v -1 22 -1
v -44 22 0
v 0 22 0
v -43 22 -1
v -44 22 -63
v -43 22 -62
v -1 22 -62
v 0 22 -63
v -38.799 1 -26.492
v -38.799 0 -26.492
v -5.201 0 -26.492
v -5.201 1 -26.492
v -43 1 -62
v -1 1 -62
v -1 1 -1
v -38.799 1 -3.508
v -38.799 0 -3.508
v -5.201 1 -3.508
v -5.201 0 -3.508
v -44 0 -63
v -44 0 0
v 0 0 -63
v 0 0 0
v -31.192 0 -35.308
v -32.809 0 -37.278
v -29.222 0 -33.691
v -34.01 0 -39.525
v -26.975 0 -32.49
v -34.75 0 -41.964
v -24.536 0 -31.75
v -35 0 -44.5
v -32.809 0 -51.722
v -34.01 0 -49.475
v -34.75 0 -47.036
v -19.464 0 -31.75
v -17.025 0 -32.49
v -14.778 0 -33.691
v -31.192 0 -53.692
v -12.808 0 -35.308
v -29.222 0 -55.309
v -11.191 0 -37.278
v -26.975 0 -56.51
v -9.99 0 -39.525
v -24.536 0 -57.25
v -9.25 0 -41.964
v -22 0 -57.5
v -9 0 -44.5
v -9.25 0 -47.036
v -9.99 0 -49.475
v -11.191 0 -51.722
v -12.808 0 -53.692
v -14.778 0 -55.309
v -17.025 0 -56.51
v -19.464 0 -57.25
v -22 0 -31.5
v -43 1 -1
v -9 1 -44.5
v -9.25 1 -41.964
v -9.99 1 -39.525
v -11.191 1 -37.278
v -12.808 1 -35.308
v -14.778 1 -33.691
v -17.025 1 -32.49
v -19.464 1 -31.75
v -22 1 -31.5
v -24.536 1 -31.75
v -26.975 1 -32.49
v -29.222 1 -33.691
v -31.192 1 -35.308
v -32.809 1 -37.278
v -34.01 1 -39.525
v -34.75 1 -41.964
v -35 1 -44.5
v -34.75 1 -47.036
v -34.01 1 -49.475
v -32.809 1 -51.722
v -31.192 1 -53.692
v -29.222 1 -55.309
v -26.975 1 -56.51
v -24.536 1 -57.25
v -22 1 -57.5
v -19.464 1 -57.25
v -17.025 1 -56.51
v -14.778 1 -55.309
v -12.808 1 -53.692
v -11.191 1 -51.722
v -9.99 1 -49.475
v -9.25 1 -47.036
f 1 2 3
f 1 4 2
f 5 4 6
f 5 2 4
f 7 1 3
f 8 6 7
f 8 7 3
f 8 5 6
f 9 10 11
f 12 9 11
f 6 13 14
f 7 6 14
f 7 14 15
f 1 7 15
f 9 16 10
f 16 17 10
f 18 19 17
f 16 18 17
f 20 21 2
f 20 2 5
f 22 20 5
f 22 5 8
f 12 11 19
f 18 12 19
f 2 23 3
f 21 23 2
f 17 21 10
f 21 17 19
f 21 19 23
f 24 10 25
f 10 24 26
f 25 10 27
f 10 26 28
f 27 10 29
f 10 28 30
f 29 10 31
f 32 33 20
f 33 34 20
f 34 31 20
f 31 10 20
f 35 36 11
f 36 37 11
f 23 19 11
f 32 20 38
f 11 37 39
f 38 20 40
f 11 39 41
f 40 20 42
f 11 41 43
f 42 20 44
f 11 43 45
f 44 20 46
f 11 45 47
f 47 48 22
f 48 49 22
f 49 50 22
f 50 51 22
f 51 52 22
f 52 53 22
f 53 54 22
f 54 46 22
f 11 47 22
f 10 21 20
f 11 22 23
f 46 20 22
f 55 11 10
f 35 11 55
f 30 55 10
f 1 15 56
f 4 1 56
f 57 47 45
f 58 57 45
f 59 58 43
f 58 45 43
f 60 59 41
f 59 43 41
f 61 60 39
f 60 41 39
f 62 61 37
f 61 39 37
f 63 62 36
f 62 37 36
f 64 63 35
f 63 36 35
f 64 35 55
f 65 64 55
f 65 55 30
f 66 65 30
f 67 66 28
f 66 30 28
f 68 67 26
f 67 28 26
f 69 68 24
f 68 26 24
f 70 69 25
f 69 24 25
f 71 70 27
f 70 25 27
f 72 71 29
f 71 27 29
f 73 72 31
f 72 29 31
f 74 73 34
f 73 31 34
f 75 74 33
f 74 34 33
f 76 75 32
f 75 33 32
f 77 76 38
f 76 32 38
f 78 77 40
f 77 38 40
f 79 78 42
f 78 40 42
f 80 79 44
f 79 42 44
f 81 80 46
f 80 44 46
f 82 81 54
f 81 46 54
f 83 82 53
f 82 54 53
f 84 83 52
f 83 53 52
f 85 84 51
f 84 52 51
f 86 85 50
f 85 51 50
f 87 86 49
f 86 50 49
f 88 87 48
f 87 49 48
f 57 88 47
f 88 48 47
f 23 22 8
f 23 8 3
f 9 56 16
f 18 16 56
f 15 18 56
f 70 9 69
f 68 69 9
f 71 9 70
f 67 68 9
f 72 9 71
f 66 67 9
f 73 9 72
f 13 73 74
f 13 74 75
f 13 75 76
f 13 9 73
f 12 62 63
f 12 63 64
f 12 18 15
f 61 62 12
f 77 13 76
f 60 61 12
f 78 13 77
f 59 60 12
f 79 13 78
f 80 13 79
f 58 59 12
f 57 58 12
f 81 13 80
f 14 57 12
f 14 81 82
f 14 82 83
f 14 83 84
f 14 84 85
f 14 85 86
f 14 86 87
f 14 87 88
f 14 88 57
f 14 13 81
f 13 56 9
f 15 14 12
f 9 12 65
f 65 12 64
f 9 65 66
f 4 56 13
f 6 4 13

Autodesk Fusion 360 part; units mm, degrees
sketch "Sketch1" plane through (0, 0, 0) normal (0, 1, 0) x (1, 0, 0)
  line L0 (0, 0) -> (-44, 0)
  line L1 (-44, 0) -> (-44, 63)
  line L2 (-44, 63) -> (0, 63)
  line L3 (0, 63) -> (0, 0)
  line L4 (-22, 0) -> (-22, 15)
  line L5 (-44, 0) -> (-22, 0)
  line L6 (-22, 0) -> (-22, 63)
  line L7 (-22, 63) -> (-22, 44.5)
  circle A0 centre (-22, 44.5) radius 13
  line L8 (-44, 63) -> (-22, 63)
  line L9 (-5.2012, 3.5077) -> (-38.7988, 3.5077)
  line L10 (-38.7988, 3.5077) -> (-38.7988, 26.4923)
  line L11 (-38.7988, 26.4923) -> (-5.2012, 26.4923)
  line L12 (-5.2012, 26.4923) -> (-5.2012, 3.5077)
  line L13 (-5.2012, 3.5077) -> (-38.7988, 26.4923) construction
  line L14 (-38.7988, 3.5077) -> (-5.2012, 26.4923) construction
  line L15 (-43, 62) -> (-1, 62)
  line L16 (-1, 62) -> (-1, 1)
  line L17 (-1, 1) -> (-43, 1)
  line L18 (-43, 1) -> (-43, 62)
  dimension "d1" = 44
  dimension "d2" = 63
  dimension "d5" = 15
  dimension "d7" = 18.5
  dimension "d8" = 26
  dimension "d9" = 21
  dimension "d13" = 21.5
  dimension "d14" = 1
extrude "Extrude3" add sketch "Sketch1" along normal blind 22 contours L0 L2 L3 L4 L6 L7 L15 L16 L17 | L0 L1 L2 L4 L5 L6 L7 L8 L15 L17 L18 makes body 1
extrude "Extrude2" add sketch "Sketch1" along normal blind 1 separate body contours L0 L2 L3 L4 L6 L7 L15 L16 L17 | L0 L1 L2 L4 L5 L6 L7 L8 L15 L17 L18 | L4 L6 L7 A0 L9 L10 L11 L15 L17 L18 | L4 L6 L7 A0 L9 L11 L12 L15 L16 L17 makes body 2
combine "Combine1" operation add target body 1 tool bodies 2
extrude "Extrude5" add sketch "Sketch1" along normal blind 21 separate body contours L4 L6 L7 A0 L9 L10 L11 L15 L17 L18 | L4 L6 L7 A0 L9 L11 L12 L15 L16 L17 | L4 L6 L9 L10 L11 | L4 L6 L9 L11 L12 | L6 L7 A0 | L6 L7 A0 makes body 3
move_body "Move1" bodies 3 to x (1, 0, 0) y (0, 1, 0) z (0, 0, 1) at (0, 1, 0)
extrude "Extrude6" add sketch "Sketch1" along normal blind -8 and the other way blind -1 separate body contours L6 L7 A0 | L6 L7 A0 makes body 4
combine "Combine2" operation add target body 4 tool bodies 3
sketch "Sketch3" plane through (0, 0, 0) normal (1, 0, 0) x (0, 0, -1)
  line L0 (44.5, -8) -> (44.5, -95.3333)
  line L1 (44.5, -8) -> (44.5007, 25.9882)
  line L2 (44.5, -8) -> (44.5, -13)
  line L3 (44.5, -8) -> (44.5, -13)
  line L4 (44.5, -8) -> (44.5, -13)
  line L5 (44.5, -5.7455) -> (28.5885, -9.273)
  line L6 (44.5, -5.7455) -> (93.193, -5.7455) construction
  line L7 (44.5, -5.7455) -> (101.0974, -5.7455) construction
  line L8 (44.5, -9.273) -> (25, -9.273)
  line L9 (28.5885, -9.273) -> (28.5885, -28.9115)
  line L10 (28.5885, -28.9115) -> (23.5129, -33.9871)
  line L11 (44.5, -13) -> (73.6492, -13) construction
  line L12 (44.5, -13) -> (28.5885, -28.9115)
  line L13 (28.5885, -28.9115) -> (-8.934, -28.9115)
  line L14 (44.5, -13) -> (28.5885, -13)
  line L15 (44.5, -13) -> (7, -12.9775)
  line L16 (7, -12.9775) -> (30.0264, -12.9775) construction
  line L17 (7, -12.9775) -> (-8.934, -28.9115)
  line L18 (-8.934, -28.9115) -> (-8.934, -33.9115)
  line L19 (6.9775, -13) -> (6.9775, -33.9115)
  line L20 (28.5885, -13) -> (6.9775, -13)
  line L21 (-8.934, -28.9115) -> (-8.934, -33.9115)
  line L22 (-8.934, -33.9115) -> (6.9775, -33.9115)
  line L23 (6.9775, -33.9115) -> (44.5, -42.23)
  line L24 (6.9775, -33.9115) -> (31.1364, -33.9115) construction
  line L25 (-8.934, -33.9115) -> (-89.4653, -51.7648)
  line L26 (-8.934, -33.9115) -> (73.5526, -33.9115) construction
  dimension "d31" = 5
  dimension "d36" = 45
  dimension "d37" = 77.5
  dimension "d38" = 37.5
  dimension "d40" = 12.5
  dimension "d41" = 167.5
sketch "Sketch4" plane through (0, 0, 0) normal (1, 0, 0) x (0, 0, -1)
  line L0 (63, 0) -> (44.5, 0)
  line L1 (44.5, 0) -> (44.5, -81.2522)
  line L2 (31.5, -8) -> (57.5, -8)
  line L3 (44.5, -8) -> (57, -8)
  line L4 (44.5, -6.4048) -> (93.5414, -6.4048) construction
  line L5 (44.5, -8) -> (44.5, -13)
  line L6 (44.5, -8) -> (31.5, -8)
  line L7 (31.5, -8) -> (34.5, -8)
  line L8 (44.5, -6.3277) -> (113.977, -6.3277) construction
  line L9 (44.5, -9.2652) -> (31.25, -9.2652)
  line L10 (31.25, -9.2652) -> (31.25, -24.1181)
  line L11 (44.5, -13) -> (31.25, -24.1181)
  line L12 (44.5, -13) -> (64.8642, -13) construction
  line L13 (44.5, -13) -> (7, -6.3877)
  line L14 (57.3025, -15.2574) -> (44.5, -13)
  line L15 (45.8772, -26.6972) -> (-6.25, -17.5058)
  line L16 (44.5, 0) -> (7, 0)
  line L17 (7, -6.3877) -> (7, -30)
  line L18 (7, -6.3877) -> (-6.25, -17.5058)
  line L19 (7, -6.3877) -> (33.2311, -6.3877) construction
  line L20 (44.5, -6.3277) -> (7, -14.6413)
  line L21 (-6.25, -17.5058) -> (-6.25, -43.4537)
  line L22 (7, -14.6413) -> (7, -36.5614)
  line L23 (7, -6.3877) -> (7, -14.6413)
  dimension "d44" = 5
  dimension "d46" = 3
  dimension "d47" = 167.5
  dimension "d49" = 50
  dimension "d50" = 37.5
  dimension "d51" = 140
hidden bodies 4
